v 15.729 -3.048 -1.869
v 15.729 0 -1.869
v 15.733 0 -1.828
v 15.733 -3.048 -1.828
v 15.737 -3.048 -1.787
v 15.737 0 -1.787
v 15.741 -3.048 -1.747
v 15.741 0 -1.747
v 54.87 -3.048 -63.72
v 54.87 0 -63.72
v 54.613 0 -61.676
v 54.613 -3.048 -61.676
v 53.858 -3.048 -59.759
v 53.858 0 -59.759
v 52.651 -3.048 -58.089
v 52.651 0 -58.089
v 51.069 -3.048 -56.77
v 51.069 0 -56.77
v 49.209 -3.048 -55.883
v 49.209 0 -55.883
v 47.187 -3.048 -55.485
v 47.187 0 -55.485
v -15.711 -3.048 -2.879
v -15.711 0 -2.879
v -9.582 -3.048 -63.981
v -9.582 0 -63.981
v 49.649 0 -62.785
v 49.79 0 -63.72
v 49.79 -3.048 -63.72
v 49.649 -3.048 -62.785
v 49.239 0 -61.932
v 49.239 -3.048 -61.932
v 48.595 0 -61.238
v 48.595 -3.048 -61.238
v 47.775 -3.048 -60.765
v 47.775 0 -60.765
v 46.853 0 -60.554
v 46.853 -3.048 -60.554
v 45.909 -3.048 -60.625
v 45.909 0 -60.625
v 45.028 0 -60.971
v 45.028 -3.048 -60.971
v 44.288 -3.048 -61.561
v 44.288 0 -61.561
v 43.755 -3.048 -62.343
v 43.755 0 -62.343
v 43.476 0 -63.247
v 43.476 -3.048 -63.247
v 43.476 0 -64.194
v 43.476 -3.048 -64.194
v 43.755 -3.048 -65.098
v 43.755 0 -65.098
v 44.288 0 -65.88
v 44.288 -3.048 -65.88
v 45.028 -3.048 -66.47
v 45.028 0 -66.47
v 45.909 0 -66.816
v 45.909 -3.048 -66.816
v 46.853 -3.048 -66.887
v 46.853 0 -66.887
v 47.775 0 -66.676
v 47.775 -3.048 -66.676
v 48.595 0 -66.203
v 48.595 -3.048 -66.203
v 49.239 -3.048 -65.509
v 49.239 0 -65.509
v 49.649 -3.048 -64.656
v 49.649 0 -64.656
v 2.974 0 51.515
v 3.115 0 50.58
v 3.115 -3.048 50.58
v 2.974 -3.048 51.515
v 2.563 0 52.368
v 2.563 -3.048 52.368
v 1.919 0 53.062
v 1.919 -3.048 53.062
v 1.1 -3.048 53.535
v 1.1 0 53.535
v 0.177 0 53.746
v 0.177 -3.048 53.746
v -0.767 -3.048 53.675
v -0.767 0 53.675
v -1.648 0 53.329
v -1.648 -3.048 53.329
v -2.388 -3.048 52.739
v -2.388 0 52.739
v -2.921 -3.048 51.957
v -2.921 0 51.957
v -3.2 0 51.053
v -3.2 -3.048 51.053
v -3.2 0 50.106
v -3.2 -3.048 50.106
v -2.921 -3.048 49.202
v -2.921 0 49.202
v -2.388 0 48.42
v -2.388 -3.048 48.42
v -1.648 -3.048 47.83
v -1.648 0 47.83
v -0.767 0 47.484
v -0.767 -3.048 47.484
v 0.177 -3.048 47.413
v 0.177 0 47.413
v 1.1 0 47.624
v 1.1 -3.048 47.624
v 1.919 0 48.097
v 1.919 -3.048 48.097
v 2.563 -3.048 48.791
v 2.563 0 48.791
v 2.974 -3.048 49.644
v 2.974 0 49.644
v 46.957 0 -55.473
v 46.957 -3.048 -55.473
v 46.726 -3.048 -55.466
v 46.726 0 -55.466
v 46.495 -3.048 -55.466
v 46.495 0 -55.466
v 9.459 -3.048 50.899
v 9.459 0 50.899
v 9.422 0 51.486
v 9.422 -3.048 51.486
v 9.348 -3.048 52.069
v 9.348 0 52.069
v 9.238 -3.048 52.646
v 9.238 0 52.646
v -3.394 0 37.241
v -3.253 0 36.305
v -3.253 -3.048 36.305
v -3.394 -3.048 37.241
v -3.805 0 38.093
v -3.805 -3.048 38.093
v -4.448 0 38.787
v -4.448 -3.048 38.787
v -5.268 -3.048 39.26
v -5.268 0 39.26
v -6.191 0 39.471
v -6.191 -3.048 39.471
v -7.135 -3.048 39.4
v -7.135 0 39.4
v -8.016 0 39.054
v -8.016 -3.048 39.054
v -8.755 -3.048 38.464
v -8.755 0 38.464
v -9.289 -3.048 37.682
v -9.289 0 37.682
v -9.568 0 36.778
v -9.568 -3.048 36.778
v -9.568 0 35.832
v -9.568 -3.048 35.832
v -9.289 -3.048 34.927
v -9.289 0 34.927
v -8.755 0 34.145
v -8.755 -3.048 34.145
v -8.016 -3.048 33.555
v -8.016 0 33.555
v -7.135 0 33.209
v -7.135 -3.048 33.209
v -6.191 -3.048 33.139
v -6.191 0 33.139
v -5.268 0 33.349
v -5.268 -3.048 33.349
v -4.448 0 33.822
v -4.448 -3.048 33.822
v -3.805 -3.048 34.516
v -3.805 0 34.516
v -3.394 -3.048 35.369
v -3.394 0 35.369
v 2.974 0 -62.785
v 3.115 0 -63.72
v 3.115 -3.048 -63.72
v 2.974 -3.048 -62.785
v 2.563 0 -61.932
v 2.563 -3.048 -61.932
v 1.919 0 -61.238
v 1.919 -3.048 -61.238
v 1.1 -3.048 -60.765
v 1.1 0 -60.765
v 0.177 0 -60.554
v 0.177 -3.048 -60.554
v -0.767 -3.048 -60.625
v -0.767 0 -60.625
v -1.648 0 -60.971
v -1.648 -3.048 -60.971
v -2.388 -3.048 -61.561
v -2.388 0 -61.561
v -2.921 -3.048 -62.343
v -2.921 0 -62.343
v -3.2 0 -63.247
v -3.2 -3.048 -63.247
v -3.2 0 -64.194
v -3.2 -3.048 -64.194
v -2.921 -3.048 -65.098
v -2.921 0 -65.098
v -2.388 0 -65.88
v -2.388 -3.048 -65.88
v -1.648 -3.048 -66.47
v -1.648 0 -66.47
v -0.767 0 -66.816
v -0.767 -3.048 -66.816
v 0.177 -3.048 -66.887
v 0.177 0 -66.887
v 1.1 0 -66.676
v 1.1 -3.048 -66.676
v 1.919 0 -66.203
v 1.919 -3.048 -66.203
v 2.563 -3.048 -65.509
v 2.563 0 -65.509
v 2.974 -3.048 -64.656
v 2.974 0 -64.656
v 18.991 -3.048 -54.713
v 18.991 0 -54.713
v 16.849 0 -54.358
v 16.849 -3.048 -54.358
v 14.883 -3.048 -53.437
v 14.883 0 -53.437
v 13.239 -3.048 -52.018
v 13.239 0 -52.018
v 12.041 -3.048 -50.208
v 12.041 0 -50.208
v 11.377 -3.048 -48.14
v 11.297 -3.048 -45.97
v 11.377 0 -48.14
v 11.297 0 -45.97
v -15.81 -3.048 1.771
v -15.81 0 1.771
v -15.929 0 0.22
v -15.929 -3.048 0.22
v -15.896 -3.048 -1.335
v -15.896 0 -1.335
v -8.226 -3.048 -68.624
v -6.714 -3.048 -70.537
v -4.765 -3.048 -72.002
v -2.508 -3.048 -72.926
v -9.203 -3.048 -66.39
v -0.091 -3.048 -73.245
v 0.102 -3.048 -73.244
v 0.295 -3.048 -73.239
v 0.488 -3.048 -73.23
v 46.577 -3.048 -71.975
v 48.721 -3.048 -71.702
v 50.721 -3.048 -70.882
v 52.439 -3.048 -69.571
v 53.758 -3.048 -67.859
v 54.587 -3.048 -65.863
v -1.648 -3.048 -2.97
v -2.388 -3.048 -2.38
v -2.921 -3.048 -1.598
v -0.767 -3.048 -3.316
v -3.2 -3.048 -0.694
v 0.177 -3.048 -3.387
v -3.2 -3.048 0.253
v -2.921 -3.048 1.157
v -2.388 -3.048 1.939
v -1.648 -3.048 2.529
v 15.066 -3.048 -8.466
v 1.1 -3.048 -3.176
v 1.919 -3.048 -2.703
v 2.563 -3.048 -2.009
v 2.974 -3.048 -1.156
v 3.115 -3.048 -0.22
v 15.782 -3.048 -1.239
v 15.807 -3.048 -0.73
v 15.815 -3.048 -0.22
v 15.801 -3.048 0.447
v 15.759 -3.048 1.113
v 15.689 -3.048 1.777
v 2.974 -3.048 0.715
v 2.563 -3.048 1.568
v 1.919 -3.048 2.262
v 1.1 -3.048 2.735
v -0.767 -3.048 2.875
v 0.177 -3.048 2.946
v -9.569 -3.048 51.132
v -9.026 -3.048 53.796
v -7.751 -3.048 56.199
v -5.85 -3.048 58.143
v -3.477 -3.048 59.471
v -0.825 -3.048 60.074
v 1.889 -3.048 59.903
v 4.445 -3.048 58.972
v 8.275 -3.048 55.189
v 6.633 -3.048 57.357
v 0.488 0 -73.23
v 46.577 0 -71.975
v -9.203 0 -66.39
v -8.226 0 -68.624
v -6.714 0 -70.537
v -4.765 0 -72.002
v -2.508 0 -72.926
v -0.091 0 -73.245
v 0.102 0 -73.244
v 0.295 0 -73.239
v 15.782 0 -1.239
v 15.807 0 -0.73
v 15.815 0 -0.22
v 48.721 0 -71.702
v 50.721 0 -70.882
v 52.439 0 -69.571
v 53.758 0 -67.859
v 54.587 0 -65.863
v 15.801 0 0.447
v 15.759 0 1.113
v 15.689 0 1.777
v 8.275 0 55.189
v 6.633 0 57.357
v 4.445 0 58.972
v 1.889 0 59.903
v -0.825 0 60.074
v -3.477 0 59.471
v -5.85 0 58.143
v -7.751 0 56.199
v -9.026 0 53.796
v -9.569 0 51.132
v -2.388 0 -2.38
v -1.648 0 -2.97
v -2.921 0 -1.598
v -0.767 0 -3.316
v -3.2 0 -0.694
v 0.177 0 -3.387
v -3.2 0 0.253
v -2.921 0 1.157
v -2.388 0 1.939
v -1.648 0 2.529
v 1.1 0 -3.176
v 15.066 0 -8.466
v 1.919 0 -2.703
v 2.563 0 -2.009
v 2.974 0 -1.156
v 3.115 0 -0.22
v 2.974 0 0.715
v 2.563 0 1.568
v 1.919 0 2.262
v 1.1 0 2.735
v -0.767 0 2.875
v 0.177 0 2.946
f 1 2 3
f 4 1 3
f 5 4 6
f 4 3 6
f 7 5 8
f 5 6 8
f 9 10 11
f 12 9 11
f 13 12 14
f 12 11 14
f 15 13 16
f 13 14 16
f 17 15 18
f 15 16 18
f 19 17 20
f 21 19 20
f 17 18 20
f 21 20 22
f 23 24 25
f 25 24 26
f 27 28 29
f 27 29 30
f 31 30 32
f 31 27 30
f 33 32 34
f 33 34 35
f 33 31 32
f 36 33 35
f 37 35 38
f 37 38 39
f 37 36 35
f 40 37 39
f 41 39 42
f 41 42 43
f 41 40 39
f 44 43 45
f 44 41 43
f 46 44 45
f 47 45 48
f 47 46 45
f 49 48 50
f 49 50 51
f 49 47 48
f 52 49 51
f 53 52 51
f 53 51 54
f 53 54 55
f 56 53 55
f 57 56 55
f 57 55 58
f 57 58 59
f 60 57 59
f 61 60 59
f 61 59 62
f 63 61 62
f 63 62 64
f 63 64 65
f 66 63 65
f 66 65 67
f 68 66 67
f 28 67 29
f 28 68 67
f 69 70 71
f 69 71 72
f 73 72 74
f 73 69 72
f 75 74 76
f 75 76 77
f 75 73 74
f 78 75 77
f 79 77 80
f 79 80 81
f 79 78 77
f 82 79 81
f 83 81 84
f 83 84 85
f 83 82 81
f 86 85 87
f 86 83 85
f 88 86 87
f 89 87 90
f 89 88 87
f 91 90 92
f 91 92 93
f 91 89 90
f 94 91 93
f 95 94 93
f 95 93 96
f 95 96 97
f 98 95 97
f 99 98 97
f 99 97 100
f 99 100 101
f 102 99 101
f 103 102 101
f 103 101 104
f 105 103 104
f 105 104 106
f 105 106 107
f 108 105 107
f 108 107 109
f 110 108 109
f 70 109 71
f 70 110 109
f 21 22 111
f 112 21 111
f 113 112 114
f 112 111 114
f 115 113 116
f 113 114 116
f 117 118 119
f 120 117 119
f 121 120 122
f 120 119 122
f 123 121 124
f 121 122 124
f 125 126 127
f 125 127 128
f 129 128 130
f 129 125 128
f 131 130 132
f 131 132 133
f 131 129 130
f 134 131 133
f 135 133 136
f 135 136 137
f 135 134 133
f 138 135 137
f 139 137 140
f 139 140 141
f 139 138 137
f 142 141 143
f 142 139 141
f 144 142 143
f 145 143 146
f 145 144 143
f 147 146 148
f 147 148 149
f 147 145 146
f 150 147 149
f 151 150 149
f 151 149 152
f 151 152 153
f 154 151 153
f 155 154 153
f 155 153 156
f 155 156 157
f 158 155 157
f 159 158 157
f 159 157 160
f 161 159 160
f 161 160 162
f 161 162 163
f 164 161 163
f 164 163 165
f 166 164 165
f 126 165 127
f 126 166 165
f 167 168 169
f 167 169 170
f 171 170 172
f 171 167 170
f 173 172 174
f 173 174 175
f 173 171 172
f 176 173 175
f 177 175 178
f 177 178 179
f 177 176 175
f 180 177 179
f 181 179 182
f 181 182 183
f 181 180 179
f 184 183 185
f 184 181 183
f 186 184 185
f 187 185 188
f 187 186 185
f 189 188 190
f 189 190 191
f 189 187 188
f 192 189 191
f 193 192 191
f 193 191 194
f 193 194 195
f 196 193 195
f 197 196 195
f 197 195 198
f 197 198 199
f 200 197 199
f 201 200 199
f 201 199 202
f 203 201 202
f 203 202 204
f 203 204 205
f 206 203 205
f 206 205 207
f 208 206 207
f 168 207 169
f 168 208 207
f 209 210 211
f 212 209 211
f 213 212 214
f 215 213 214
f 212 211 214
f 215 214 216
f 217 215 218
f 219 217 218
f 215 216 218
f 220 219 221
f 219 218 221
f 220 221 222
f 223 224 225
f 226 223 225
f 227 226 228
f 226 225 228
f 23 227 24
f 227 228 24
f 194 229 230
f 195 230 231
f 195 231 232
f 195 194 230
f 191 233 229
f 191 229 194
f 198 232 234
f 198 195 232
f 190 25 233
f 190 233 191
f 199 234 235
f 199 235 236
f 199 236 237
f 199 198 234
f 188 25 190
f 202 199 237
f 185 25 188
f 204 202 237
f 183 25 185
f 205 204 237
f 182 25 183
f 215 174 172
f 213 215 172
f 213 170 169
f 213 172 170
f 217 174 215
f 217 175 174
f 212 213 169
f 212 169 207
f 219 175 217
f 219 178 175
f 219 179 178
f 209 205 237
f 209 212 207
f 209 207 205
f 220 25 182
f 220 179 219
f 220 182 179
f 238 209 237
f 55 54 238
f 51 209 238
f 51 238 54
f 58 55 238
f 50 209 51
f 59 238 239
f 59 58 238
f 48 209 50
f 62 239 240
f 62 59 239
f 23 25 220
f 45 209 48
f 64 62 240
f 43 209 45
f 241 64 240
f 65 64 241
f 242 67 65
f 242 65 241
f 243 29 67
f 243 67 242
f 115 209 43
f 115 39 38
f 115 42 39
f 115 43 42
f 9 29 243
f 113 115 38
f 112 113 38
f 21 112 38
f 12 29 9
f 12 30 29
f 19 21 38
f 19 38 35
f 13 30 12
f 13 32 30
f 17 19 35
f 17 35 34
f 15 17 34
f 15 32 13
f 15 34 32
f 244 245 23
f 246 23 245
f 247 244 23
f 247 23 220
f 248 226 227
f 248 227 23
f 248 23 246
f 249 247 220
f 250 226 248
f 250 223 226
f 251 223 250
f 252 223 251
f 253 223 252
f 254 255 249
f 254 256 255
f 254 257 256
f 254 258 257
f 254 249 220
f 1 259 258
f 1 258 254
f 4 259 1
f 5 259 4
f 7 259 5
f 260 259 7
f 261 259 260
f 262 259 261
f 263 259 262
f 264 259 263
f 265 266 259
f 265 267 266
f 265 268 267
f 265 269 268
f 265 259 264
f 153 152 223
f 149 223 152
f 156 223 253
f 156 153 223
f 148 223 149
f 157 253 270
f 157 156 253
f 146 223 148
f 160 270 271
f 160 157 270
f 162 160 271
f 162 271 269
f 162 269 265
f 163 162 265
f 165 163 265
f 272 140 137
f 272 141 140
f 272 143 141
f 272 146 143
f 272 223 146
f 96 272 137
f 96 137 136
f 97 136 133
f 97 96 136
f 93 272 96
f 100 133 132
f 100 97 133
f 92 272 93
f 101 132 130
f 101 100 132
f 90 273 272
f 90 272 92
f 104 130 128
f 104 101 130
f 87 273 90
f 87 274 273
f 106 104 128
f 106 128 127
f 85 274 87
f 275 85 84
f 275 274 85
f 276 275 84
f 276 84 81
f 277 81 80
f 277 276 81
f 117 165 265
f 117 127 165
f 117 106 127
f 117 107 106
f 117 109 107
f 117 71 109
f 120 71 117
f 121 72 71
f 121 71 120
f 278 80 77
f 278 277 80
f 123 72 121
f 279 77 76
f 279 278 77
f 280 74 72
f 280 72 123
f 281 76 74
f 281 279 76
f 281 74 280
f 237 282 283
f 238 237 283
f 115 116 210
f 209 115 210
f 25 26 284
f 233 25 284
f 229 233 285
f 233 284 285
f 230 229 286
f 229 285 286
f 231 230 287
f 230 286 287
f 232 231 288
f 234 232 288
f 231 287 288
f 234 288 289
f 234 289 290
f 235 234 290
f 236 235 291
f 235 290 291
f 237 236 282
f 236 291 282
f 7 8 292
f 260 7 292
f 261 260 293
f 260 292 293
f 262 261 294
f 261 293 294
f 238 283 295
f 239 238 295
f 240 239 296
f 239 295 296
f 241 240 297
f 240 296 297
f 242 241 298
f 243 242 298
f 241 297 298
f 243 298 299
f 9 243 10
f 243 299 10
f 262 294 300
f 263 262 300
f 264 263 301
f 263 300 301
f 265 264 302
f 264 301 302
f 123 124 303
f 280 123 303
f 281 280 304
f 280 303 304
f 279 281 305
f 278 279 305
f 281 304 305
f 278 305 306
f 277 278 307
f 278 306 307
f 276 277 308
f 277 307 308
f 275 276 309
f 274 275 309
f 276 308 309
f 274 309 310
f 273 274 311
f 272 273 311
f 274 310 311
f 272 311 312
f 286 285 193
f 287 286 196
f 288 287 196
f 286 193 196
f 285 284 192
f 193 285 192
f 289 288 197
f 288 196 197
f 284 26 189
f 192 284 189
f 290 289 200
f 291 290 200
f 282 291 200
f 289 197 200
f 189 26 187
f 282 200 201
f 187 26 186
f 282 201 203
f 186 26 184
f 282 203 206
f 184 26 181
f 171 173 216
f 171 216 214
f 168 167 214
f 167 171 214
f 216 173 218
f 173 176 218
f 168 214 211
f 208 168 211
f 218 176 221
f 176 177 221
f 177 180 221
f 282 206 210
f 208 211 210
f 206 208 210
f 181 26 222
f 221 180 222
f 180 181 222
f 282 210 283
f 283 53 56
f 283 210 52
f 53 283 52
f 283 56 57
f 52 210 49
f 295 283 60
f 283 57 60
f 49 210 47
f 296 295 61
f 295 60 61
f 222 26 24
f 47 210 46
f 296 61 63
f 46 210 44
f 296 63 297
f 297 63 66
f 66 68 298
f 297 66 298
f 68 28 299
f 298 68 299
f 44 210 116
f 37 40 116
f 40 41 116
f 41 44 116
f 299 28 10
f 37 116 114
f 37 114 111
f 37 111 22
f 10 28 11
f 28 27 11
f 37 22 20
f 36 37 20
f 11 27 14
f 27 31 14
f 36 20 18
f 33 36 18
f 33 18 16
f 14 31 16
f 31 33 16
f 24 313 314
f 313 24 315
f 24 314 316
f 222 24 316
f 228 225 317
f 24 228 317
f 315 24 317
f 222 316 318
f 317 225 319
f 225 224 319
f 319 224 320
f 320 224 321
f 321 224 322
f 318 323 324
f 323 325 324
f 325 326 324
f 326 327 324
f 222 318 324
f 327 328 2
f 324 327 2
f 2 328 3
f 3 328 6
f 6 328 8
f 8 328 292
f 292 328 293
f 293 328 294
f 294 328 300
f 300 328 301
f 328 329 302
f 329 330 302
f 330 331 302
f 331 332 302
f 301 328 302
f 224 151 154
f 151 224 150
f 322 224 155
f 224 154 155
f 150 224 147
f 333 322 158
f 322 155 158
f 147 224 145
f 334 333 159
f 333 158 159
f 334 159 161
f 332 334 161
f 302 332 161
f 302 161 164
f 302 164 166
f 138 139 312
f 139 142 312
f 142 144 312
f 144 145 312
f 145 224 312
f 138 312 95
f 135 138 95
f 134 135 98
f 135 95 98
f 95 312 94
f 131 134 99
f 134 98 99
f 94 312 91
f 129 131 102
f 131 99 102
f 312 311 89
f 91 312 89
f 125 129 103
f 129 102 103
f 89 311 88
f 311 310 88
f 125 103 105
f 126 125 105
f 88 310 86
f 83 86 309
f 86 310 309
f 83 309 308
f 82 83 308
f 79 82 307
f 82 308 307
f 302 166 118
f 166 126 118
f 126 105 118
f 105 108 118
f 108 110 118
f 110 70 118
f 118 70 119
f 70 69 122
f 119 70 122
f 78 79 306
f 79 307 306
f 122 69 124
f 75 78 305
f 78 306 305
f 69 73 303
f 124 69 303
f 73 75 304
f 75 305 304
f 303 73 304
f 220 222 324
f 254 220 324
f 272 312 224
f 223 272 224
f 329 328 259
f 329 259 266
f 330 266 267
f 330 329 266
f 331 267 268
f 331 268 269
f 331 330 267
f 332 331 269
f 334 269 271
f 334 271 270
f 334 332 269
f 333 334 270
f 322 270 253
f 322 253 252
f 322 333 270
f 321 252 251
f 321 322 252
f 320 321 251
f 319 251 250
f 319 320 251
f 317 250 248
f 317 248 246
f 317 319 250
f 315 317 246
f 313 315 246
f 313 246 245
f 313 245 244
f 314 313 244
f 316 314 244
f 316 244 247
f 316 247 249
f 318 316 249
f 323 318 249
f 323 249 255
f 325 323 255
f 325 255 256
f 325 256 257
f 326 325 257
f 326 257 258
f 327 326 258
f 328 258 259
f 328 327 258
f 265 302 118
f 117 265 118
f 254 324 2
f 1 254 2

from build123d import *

# Parameters (mm, degrees)
F0_R     = 3.175
F1_DEPTH = 3.048


with BuildPart() as f1:
    # F0 (on Front) → F1 (new body)
    with BuildSketch(Plane.XZ):
        with BuildLine():
            Line((15.06596, -8.46577), (15.741248, -1.746608))
            ThreePointArc((15.741248, -1.746608), (0.511091, -16.085167), (-15.710986, -2.879252))
            Line((-15.710986, -2.879252), (-9.581655, -63.981123))
            ThreePointArc((-9.581655, -63.981123), (-0.19057, -54.196342), (9.464778, -63.72045))
            ThreePointArc((9.464778, -63.72045), (6.866195, -70.258827), (0.488322, -73.229642))
            Line((0.488322, -73.229642), (46.577481, -71.975364))
            ThreePointArc((46.577481, -71.975364), (38.36044, -63.761697), (46.494992, -55.466328))
            Line((46.494992, -55.466328), (18.991247, -54.712712))
            ThreePointArc((18.991247, -54.712712), (13.239164, -52.018093), (11.296671, -45.970435))
            Line((11.296671, -45.970435), (15.06596, -8.46577))
        make_face()
        with BuildLine():
            ThreePointArc((-15.710986, -2.879252), (0.511091, -16.085167), (15.741248, -1.746608))
            ThreePointArc((15.741248, -1.746608), (15.796385, -0.984415), (15.814778, -0.22045))
            ThreePointArc((15.814778, -0.22045), (15.783216, 0.780095), (15.688656, 1.776662))
            ThreePointArc((15.688656, 1.776662), (-0.063198, 15.654549), (-15.809848, 1.770757))
            ThreePointArc((-15.809848, 1.770757), (-15.931636, -0.557888), (-15.710986, -2.879252))
        make_face()
        with Locations((-0.060222, -0.22045)):
            Circle(F0_R, mode=Mode.SUBTRACT)
        with BuildLine():
            ThreePointArc((9.464778, -63.72045), (-0.19057, -54.196342), (-9.581655, -63.981123))
            ThreePointArc((-9.581655, -63.981123), (-6.713551, -70.536522), (-0.090768, -73.245402))
            Line((-0.090768, -73.245402), (0.488322, -73.229642))
            ThreePointArc((0.488322, -73.229642), (6.866195, -70.258827), (9.464778, -63.72045))
        make_face()
        with Locations((-0.060222, -63.72045)):
            Circle(F0_R, mode=Mode.SUBTRACT)
        with BuildLine():
            Line((-9.56921, 51.131614), (-15.809848, 1.770757))
            ThreePointArc((-15.809848, 1.770757), (-0.063198, 15.654549), (15.688656, 1.776662))
            Line((15.688656, 1.776662), (9.459404, 50.899448))
            ThreePointArc((9.459404, 50.899448), (9.463434, 50.739521), (9.464778, 50.57955))
            ThreePointArc((9.464778, 50.57955), (-0.336371, 41.058553), (-9.56921, 51.131614))
        make_face()
        with Locations((-6.428017, 36.30475)):
            Circle(F0_R, mode=Mode.SUBTRACT)
        with BuildLine():
            Line((0.488322, -73.229642), (-0.090768, -73.245402))
            ThreePointArc((-0.090768, -73.245402), (0.198897, -73.241925), (0.488322, -73.229642))
        make_face()
        with BuildLine():
            ThreePointArc((9.237933, 52.645931), (-0.824684, 60.073823), (-9.56921, 51.131614))
            ThreePointArc((-9.56921, 51.131614), (-0.336371, 41.058553), (9.464778, 50.57955))
            ThreePointArc((9.464778, 50.57955), (9.463434, 50.739521), (9.459404, 50.899448))
            Line((9.459404, 50.899448), (9.237933, 52.645931))
        make_face()
        with Locations((-0.060222, 50.57955)):
            Circle(F0_R, mode=Mode.SUBTRACT)
        with BuildLine():
            Line((9.237933, 52.645931), (9.459404, 50.899448))
            ThreePointArc((9.459404, 50.899448), (9.389105, 51.777817), (9.237933, 52.645931))
        make_face()
        with BuildLine():
            Line((47.187497, -55.485303), (46.494992, -55.466328))
            ThreePointArc((46.494992, -55.466328), (38.36044, -63.761697), (46.577481, -71.975364))
            ThreePointArc((46.577481, -71.975364), (52.439104, -69.570986), (54.870337, -63.72045))
            ThreePointArc((54.870337, -63.72045), (52.651404, -58.089205), (47.187497, -55.485303))
        make_face()
        with Locations((46.615337, -63.72045)):
            Circle(F0_R, mode=Mode.SUBTRACT)
        with BuildLine():
            ThreePointArc((47.187497, -55.485303), (46.841444, -55.468548), (46.494992, -55.466328))
            Line((46.494992, -55.466328), (47.187497, -55.485303))
        make_face()
    extrude(amount=F1_DEPTH)


solid = f1.part
